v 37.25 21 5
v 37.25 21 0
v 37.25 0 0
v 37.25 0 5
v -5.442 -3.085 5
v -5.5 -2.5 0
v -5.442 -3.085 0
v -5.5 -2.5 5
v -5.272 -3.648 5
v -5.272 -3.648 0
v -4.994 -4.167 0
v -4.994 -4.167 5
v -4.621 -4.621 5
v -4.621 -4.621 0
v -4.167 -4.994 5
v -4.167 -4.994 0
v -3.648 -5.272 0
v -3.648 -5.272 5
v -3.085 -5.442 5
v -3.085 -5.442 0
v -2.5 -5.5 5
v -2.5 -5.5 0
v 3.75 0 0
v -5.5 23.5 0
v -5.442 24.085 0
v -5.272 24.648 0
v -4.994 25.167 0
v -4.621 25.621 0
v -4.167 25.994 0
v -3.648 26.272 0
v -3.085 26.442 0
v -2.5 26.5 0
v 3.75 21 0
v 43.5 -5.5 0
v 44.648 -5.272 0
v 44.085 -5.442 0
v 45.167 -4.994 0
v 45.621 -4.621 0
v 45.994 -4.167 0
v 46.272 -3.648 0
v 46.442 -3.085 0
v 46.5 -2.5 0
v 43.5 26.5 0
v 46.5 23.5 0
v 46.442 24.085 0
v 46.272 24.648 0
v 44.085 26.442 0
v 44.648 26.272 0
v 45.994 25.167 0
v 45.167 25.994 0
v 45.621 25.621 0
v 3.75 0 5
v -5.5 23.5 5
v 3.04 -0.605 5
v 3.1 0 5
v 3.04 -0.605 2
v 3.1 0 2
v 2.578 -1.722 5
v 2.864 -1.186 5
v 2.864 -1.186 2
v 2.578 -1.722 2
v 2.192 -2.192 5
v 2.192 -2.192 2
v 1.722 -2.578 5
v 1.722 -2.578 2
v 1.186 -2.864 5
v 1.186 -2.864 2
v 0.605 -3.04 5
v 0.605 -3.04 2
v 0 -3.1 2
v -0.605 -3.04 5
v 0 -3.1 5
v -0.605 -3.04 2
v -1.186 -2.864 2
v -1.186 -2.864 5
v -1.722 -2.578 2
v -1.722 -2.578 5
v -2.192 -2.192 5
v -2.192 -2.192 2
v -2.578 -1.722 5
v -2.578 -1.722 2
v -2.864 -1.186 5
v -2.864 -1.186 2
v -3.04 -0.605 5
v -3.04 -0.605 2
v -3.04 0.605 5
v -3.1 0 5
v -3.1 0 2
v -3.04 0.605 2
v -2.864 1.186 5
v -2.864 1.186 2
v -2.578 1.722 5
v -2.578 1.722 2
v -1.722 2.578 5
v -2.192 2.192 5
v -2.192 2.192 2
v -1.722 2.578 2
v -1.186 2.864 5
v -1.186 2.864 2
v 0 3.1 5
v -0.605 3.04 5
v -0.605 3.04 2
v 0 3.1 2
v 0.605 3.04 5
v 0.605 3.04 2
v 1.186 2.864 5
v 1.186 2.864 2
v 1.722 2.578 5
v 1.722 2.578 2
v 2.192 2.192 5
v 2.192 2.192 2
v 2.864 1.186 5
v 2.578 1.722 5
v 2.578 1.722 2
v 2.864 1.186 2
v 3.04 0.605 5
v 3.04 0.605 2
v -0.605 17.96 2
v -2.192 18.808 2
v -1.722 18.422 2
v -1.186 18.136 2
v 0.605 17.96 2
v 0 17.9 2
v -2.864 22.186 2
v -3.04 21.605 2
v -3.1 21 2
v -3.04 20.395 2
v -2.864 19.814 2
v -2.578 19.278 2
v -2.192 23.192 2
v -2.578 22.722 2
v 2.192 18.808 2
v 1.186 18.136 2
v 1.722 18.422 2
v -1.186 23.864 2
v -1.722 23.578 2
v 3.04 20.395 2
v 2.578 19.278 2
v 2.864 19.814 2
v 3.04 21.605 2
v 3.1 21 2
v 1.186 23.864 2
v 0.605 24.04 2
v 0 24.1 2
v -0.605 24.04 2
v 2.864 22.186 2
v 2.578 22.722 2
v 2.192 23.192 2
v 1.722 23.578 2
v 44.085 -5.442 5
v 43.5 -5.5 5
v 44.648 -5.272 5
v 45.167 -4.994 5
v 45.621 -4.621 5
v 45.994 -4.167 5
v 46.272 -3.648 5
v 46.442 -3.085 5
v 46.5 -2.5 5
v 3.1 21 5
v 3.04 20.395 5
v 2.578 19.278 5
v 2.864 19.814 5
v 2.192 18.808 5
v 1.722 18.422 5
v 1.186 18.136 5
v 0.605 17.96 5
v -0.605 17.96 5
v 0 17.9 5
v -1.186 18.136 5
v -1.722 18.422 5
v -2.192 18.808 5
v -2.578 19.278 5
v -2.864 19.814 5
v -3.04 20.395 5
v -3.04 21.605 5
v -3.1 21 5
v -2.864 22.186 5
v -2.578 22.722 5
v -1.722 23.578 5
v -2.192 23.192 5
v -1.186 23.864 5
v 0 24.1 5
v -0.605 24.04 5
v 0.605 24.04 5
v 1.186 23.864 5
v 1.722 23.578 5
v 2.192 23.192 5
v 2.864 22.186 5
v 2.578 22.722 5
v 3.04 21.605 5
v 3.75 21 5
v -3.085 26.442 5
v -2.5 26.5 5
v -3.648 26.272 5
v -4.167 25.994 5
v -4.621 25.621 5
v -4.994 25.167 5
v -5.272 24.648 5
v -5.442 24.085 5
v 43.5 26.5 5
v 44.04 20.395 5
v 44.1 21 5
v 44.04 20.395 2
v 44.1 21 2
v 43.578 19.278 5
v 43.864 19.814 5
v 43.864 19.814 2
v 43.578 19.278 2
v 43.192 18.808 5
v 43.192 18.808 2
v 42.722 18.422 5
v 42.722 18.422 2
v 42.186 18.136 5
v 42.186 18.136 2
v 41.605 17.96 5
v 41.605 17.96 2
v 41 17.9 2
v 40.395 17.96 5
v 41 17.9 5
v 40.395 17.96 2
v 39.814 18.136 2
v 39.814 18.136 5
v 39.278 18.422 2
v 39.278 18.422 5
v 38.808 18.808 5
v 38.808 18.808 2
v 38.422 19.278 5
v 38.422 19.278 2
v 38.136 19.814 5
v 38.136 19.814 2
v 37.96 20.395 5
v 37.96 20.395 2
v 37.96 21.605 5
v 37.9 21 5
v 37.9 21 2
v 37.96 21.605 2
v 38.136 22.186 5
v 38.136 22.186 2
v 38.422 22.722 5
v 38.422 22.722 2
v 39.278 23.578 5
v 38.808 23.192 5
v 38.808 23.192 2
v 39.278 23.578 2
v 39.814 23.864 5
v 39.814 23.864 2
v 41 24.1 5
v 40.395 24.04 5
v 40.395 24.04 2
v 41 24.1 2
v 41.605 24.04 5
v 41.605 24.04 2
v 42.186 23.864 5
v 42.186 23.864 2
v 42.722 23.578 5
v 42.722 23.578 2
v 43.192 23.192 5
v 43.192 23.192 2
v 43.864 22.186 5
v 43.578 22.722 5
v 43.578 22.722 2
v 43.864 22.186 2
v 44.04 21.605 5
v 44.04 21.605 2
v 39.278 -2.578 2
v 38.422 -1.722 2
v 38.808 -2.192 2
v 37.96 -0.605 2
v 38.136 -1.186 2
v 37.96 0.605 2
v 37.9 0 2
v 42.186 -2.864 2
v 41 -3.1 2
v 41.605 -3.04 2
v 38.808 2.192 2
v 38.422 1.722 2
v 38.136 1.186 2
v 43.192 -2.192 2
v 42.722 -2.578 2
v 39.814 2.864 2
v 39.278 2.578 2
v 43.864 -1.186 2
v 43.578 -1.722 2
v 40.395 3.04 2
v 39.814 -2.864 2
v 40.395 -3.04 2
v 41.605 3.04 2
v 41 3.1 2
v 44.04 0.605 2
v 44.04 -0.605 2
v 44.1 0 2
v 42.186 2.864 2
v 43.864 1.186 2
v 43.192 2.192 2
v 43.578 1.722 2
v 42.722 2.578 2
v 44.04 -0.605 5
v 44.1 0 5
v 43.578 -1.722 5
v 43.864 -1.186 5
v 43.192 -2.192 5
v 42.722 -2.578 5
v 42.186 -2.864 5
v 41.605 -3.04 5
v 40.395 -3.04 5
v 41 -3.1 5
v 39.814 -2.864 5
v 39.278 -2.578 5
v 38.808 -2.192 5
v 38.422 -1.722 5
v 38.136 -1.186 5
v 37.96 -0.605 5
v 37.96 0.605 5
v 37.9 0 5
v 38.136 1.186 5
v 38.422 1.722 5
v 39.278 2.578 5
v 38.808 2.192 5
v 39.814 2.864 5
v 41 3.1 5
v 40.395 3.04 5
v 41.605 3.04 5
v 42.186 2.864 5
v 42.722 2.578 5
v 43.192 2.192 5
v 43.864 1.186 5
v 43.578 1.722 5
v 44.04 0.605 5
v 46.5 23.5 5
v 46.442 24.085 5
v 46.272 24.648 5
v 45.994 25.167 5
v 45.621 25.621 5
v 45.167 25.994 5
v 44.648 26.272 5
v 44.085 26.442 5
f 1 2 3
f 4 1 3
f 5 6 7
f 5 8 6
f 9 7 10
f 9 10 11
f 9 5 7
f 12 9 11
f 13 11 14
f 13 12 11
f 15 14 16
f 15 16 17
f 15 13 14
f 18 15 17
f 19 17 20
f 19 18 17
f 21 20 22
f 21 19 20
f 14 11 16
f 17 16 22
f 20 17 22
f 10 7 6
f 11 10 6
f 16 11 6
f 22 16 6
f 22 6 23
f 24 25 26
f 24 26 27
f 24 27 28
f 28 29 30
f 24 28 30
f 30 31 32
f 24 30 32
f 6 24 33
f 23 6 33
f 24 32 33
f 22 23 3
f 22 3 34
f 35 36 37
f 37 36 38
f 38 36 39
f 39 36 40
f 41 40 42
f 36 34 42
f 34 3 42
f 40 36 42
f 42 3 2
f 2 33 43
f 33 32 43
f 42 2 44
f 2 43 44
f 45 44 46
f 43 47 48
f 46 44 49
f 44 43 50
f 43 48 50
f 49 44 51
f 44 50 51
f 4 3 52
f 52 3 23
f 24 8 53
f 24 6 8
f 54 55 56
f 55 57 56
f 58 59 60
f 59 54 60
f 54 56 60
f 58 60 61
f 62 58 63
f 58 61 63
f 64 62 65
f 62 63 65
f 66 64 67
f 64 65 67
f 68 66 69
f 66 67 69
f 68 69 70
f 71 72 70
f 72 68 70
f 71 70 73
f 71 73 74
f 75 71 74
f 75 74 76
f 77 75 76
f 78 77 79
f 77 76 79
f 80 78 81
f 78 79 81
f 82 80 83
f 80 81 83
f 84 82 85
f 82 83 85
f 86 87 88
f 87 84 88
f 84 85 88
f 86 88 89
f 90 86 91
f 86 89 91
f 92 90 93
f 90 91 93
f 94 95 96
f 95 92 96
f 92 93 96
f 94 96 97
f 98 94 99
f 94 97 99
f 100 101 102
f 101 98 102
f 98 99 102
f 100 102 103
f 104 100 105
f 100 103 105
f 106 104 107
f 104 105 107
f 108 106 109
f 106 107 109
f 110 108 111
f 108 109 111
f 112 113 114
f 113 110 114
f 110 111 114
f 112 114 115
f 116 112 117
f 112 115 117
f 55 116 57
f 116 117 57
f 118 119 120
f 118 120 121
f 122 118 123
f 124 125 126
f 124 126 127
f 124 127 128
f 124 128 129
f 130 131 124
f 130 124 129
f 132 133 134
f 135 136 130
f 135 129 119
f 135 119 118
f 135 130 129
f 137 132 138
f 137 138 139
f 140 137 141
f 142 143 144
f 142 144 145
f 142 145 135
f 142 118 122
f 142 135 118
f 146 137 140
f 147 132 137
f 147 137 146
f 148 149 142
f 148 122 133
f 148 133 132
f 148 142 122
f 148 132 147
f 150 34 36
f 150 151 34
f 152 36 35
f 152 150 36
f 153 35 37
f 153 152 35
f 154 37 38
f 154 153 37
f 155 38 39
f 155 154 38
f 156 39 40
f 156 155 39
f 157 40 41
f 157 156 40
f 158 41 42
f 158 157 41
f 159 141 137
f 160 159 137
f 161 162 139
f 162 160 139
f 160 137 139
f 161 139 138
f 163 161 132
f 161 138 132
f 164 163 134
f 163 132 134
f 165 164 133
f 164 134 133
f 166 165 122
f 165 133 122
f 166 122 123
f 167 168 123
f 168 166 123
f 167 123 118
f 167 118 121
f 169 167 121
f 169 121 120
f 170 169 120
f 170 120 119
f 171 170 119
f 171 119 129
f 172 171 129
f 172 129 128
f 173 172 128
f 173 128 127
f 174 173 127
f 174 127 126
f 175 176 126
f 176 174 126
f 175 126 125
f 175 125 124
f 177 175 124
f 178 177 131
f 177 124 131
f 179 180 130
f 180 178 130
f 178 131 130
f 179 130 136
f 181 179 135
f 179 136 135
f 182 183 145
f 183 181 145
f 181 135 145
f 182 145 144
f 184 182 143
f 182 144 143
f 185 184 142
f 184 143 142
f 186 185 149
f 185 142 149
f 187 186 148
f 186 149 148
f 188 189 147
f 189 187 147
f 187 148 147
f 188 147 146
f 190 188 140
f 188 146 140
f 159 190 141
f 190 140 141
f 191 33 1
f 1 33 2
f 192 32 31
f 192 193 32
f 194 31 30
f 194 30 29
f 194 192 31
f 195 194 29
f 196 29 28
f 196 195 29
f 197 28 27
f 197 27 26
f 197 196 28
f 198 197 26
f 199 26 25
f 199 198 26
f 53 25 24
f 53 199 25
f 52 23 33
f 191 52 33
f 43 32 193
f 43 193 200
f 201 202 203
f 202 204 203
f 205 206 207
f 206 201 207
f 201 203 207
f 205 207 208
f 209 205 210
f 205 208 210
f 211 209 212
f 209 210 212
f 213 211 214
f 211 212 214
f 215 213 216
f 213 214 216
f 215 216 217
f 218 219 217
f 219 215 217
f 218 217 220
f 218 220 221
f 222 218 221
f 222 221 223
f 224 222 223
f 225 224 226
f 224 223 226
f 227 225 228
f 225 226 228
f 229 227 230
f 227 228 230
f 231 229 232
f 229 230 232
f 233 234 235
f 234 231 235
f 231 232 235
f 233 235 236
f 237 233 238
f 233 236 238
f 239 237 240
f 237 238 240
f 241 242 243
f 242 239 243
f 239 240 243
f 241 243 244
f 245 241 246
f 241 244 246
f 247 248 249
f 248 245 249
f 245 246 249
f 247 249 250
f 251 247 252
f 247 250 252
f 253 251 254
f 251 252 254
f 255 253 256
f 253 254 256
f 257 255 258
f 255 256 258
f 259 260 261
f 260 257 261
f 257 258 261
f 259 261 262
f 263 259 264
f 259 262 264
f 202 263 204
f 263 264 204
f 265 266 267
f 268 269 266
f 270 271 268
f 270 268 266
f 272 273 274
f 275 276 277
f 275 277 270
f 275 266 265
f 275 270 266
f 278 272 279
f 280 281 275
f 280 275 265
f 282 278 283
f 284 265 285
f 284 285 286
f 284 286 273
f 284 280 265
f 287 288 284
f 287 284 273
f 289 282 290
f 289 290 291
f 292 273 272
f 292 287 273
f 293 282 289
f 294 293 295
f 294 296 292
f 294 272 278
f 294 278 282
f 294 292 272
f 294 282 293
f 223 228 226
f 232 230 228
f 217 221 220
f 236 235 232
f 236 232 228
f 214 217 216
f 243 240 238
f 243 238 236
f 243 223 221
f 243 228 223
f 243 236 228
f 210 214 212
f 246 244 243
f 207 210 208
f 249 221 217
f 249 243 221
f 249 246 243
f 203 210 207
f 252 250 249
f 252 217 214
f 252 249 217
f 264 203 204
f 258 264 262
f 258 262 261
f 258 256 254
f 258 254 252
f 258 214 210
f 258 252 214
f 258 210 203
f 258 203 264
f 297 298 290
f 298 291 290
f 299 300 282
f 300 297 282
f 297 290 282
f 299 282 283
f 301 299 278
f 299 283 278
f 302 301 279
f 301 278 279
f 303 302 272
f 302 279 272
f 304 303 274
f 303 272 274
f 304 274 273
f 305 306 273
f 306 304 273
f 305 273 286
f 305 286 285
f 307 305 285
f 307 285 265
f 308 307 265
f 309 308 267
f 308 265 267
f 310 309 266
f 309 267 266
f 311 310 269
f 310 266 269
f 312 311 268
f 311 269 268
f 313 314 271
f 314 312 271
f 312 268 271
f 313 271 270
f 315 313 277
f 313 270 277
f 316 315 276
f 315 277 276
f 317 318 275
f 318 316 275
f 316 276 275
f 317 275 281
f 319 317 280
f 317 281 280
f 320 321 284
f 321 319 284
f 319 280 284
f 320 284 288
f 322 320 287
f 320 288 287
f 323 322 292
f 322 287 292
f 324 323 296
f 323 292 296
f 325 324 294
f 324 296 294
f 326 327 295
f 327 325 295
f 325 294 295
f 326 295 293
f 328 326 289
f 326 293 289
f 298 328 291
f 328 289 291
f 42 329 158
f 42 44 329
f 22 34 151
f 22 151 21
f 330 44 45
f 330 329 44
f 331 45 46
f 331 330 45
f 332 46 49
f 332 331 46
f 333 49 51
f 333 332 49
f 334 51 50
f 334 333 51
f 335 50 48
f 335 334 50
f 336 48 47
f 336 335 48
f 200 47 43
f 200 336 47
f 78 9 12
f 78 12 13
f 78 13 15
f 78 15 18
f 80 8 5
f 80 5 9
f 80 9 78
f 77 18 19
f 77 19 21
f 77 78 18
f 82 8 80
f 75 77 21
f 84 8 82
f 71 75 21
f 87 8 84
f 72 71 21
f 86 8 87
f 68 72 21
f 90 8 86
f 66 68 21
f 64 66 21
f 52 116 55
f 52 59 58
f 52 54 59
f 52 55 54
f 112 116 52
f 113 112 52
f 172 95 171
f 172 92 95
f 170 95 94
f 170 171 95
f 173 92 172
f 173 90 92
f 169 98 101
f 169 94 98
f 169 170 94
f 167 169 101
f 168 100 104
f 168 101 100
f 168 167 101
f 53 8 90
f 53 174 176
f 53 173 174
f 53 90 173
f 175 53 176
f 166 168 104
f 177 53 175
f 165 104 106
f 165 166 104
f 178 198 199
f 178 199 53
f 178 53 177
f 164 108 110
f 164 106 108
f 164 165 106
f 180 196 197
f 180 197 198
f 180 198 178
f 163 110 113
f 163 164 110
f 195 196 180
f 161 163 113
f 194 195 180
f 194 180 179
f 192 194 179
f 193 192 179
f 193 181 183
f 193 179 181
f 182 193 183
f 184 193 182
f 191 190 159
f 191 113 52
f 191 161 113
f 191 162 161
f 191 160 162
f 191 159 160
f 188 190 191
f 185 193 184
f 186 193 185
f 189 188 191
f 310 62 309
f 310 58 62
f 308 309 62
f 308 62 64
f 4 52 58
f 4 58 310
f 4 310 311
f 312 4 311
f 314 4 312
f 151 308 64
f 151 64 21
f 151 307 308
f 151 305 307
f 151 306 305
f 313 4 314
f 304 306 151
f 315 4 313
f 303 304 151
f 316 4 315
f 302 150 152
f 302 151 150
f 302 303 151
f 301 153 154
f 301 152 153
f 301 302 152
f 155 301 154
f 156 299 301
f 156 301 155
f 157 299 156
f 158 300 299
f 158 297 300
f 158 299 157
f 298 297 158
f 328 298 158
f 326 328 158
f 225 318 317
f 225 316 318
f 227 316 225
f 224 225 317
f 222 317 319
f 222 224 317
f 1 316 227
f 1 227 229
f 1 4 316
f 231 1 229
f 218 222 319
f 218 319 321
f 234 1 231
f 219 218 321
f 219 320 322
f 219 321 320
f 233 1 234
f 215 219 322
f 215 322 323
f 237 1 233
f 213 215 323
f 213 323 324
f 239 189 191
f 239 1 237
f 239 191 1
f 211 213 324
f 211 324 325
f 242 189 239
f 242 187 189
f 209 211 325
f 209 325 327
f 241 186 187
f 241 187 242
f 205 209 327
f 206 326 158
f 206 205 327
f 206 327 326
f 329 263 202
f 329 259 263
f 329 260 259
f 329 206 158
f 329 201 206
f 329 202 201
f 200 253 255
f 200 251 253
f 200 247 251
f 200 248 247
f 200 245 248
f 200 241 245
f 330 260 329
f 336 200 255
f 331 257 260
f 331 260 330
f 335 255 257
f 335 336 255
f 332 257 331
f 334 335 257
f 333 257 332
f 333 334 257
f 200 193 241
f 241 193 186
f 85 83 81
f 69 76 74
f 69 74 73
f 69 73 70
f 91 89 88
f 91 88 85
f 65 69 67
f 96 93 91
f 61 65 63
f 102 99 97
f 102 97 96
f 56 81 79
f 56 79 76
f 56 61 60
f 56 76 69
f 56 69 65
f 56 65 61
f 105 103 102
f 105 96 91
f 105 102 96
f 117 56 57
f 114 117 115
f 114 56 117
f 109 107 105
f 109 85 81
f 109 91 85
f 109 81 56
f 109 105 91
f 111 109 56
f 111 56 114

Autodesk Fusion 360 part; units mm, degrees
sketch "Sketch1" plane through (0, 0, 0) normal (0, 0, 1) x (1, 0, 0)
  circle A0 centre (0, 0) radius 3.1
  circle A1 centre (41, 0) radius 3.1
  circle A2 centre (0, 21) radius 3.1
  circle A3 centre (41, 21) radius 3.1
  line L0 (-5.5, 26.5) -> (46.5, 26.5)
  line L1 (46.5, 26.5) -> (46.5, -5.5)
  line L2 (46.5, -5.5) -> (-5.5, -5.5)
  line L3 (-5.5, -5.5) -> (-5.5, 26.5)
  line L4 (3.75, 21) -> (37.25, 21)
  line L5 (37.25, 21) -> (37.25, 0)
  line L6 (37.25, 0) -> (3.75, 0)
  line L7 (3.75, 0) -> (3.75, 21)
  line L8 (20.5, 26.5) -> (20.5, 21) construction
  line L9 (3.75, 10.5) -> (-5.5, 10.5) construction
  point P0 (20.5, 26.5)
  point P1 (20.5, 21)
  point P2 (-5.5, 10.5)
  point P3 (3.75, 10.5)
  dimension "d1" = 6.2
  dimension "d4" = 41
  dimension "d5" = 21
  dimension "d18" = 5.5
  dimension "d19" = 5.5
  dimension "d20" = 32
  dimension "d21" = 52
  dimension "d22" = 33.5
  dimension "d23" = 21
extrude "Extrude1" add sketch "Sketch1" along normal blind 5
extrude "Extrude2" add sketch "Sketch1" along normal blind 2 contours A0 | A1 | A2 | A3
fillet "Fillet1" radius 3 4 edges at (46.5, 26.5, 2.5) (-5.5, 26.5, 2.5) (46.5, -5.5, 2.5) (-5.5, -5.5, 2.5)
